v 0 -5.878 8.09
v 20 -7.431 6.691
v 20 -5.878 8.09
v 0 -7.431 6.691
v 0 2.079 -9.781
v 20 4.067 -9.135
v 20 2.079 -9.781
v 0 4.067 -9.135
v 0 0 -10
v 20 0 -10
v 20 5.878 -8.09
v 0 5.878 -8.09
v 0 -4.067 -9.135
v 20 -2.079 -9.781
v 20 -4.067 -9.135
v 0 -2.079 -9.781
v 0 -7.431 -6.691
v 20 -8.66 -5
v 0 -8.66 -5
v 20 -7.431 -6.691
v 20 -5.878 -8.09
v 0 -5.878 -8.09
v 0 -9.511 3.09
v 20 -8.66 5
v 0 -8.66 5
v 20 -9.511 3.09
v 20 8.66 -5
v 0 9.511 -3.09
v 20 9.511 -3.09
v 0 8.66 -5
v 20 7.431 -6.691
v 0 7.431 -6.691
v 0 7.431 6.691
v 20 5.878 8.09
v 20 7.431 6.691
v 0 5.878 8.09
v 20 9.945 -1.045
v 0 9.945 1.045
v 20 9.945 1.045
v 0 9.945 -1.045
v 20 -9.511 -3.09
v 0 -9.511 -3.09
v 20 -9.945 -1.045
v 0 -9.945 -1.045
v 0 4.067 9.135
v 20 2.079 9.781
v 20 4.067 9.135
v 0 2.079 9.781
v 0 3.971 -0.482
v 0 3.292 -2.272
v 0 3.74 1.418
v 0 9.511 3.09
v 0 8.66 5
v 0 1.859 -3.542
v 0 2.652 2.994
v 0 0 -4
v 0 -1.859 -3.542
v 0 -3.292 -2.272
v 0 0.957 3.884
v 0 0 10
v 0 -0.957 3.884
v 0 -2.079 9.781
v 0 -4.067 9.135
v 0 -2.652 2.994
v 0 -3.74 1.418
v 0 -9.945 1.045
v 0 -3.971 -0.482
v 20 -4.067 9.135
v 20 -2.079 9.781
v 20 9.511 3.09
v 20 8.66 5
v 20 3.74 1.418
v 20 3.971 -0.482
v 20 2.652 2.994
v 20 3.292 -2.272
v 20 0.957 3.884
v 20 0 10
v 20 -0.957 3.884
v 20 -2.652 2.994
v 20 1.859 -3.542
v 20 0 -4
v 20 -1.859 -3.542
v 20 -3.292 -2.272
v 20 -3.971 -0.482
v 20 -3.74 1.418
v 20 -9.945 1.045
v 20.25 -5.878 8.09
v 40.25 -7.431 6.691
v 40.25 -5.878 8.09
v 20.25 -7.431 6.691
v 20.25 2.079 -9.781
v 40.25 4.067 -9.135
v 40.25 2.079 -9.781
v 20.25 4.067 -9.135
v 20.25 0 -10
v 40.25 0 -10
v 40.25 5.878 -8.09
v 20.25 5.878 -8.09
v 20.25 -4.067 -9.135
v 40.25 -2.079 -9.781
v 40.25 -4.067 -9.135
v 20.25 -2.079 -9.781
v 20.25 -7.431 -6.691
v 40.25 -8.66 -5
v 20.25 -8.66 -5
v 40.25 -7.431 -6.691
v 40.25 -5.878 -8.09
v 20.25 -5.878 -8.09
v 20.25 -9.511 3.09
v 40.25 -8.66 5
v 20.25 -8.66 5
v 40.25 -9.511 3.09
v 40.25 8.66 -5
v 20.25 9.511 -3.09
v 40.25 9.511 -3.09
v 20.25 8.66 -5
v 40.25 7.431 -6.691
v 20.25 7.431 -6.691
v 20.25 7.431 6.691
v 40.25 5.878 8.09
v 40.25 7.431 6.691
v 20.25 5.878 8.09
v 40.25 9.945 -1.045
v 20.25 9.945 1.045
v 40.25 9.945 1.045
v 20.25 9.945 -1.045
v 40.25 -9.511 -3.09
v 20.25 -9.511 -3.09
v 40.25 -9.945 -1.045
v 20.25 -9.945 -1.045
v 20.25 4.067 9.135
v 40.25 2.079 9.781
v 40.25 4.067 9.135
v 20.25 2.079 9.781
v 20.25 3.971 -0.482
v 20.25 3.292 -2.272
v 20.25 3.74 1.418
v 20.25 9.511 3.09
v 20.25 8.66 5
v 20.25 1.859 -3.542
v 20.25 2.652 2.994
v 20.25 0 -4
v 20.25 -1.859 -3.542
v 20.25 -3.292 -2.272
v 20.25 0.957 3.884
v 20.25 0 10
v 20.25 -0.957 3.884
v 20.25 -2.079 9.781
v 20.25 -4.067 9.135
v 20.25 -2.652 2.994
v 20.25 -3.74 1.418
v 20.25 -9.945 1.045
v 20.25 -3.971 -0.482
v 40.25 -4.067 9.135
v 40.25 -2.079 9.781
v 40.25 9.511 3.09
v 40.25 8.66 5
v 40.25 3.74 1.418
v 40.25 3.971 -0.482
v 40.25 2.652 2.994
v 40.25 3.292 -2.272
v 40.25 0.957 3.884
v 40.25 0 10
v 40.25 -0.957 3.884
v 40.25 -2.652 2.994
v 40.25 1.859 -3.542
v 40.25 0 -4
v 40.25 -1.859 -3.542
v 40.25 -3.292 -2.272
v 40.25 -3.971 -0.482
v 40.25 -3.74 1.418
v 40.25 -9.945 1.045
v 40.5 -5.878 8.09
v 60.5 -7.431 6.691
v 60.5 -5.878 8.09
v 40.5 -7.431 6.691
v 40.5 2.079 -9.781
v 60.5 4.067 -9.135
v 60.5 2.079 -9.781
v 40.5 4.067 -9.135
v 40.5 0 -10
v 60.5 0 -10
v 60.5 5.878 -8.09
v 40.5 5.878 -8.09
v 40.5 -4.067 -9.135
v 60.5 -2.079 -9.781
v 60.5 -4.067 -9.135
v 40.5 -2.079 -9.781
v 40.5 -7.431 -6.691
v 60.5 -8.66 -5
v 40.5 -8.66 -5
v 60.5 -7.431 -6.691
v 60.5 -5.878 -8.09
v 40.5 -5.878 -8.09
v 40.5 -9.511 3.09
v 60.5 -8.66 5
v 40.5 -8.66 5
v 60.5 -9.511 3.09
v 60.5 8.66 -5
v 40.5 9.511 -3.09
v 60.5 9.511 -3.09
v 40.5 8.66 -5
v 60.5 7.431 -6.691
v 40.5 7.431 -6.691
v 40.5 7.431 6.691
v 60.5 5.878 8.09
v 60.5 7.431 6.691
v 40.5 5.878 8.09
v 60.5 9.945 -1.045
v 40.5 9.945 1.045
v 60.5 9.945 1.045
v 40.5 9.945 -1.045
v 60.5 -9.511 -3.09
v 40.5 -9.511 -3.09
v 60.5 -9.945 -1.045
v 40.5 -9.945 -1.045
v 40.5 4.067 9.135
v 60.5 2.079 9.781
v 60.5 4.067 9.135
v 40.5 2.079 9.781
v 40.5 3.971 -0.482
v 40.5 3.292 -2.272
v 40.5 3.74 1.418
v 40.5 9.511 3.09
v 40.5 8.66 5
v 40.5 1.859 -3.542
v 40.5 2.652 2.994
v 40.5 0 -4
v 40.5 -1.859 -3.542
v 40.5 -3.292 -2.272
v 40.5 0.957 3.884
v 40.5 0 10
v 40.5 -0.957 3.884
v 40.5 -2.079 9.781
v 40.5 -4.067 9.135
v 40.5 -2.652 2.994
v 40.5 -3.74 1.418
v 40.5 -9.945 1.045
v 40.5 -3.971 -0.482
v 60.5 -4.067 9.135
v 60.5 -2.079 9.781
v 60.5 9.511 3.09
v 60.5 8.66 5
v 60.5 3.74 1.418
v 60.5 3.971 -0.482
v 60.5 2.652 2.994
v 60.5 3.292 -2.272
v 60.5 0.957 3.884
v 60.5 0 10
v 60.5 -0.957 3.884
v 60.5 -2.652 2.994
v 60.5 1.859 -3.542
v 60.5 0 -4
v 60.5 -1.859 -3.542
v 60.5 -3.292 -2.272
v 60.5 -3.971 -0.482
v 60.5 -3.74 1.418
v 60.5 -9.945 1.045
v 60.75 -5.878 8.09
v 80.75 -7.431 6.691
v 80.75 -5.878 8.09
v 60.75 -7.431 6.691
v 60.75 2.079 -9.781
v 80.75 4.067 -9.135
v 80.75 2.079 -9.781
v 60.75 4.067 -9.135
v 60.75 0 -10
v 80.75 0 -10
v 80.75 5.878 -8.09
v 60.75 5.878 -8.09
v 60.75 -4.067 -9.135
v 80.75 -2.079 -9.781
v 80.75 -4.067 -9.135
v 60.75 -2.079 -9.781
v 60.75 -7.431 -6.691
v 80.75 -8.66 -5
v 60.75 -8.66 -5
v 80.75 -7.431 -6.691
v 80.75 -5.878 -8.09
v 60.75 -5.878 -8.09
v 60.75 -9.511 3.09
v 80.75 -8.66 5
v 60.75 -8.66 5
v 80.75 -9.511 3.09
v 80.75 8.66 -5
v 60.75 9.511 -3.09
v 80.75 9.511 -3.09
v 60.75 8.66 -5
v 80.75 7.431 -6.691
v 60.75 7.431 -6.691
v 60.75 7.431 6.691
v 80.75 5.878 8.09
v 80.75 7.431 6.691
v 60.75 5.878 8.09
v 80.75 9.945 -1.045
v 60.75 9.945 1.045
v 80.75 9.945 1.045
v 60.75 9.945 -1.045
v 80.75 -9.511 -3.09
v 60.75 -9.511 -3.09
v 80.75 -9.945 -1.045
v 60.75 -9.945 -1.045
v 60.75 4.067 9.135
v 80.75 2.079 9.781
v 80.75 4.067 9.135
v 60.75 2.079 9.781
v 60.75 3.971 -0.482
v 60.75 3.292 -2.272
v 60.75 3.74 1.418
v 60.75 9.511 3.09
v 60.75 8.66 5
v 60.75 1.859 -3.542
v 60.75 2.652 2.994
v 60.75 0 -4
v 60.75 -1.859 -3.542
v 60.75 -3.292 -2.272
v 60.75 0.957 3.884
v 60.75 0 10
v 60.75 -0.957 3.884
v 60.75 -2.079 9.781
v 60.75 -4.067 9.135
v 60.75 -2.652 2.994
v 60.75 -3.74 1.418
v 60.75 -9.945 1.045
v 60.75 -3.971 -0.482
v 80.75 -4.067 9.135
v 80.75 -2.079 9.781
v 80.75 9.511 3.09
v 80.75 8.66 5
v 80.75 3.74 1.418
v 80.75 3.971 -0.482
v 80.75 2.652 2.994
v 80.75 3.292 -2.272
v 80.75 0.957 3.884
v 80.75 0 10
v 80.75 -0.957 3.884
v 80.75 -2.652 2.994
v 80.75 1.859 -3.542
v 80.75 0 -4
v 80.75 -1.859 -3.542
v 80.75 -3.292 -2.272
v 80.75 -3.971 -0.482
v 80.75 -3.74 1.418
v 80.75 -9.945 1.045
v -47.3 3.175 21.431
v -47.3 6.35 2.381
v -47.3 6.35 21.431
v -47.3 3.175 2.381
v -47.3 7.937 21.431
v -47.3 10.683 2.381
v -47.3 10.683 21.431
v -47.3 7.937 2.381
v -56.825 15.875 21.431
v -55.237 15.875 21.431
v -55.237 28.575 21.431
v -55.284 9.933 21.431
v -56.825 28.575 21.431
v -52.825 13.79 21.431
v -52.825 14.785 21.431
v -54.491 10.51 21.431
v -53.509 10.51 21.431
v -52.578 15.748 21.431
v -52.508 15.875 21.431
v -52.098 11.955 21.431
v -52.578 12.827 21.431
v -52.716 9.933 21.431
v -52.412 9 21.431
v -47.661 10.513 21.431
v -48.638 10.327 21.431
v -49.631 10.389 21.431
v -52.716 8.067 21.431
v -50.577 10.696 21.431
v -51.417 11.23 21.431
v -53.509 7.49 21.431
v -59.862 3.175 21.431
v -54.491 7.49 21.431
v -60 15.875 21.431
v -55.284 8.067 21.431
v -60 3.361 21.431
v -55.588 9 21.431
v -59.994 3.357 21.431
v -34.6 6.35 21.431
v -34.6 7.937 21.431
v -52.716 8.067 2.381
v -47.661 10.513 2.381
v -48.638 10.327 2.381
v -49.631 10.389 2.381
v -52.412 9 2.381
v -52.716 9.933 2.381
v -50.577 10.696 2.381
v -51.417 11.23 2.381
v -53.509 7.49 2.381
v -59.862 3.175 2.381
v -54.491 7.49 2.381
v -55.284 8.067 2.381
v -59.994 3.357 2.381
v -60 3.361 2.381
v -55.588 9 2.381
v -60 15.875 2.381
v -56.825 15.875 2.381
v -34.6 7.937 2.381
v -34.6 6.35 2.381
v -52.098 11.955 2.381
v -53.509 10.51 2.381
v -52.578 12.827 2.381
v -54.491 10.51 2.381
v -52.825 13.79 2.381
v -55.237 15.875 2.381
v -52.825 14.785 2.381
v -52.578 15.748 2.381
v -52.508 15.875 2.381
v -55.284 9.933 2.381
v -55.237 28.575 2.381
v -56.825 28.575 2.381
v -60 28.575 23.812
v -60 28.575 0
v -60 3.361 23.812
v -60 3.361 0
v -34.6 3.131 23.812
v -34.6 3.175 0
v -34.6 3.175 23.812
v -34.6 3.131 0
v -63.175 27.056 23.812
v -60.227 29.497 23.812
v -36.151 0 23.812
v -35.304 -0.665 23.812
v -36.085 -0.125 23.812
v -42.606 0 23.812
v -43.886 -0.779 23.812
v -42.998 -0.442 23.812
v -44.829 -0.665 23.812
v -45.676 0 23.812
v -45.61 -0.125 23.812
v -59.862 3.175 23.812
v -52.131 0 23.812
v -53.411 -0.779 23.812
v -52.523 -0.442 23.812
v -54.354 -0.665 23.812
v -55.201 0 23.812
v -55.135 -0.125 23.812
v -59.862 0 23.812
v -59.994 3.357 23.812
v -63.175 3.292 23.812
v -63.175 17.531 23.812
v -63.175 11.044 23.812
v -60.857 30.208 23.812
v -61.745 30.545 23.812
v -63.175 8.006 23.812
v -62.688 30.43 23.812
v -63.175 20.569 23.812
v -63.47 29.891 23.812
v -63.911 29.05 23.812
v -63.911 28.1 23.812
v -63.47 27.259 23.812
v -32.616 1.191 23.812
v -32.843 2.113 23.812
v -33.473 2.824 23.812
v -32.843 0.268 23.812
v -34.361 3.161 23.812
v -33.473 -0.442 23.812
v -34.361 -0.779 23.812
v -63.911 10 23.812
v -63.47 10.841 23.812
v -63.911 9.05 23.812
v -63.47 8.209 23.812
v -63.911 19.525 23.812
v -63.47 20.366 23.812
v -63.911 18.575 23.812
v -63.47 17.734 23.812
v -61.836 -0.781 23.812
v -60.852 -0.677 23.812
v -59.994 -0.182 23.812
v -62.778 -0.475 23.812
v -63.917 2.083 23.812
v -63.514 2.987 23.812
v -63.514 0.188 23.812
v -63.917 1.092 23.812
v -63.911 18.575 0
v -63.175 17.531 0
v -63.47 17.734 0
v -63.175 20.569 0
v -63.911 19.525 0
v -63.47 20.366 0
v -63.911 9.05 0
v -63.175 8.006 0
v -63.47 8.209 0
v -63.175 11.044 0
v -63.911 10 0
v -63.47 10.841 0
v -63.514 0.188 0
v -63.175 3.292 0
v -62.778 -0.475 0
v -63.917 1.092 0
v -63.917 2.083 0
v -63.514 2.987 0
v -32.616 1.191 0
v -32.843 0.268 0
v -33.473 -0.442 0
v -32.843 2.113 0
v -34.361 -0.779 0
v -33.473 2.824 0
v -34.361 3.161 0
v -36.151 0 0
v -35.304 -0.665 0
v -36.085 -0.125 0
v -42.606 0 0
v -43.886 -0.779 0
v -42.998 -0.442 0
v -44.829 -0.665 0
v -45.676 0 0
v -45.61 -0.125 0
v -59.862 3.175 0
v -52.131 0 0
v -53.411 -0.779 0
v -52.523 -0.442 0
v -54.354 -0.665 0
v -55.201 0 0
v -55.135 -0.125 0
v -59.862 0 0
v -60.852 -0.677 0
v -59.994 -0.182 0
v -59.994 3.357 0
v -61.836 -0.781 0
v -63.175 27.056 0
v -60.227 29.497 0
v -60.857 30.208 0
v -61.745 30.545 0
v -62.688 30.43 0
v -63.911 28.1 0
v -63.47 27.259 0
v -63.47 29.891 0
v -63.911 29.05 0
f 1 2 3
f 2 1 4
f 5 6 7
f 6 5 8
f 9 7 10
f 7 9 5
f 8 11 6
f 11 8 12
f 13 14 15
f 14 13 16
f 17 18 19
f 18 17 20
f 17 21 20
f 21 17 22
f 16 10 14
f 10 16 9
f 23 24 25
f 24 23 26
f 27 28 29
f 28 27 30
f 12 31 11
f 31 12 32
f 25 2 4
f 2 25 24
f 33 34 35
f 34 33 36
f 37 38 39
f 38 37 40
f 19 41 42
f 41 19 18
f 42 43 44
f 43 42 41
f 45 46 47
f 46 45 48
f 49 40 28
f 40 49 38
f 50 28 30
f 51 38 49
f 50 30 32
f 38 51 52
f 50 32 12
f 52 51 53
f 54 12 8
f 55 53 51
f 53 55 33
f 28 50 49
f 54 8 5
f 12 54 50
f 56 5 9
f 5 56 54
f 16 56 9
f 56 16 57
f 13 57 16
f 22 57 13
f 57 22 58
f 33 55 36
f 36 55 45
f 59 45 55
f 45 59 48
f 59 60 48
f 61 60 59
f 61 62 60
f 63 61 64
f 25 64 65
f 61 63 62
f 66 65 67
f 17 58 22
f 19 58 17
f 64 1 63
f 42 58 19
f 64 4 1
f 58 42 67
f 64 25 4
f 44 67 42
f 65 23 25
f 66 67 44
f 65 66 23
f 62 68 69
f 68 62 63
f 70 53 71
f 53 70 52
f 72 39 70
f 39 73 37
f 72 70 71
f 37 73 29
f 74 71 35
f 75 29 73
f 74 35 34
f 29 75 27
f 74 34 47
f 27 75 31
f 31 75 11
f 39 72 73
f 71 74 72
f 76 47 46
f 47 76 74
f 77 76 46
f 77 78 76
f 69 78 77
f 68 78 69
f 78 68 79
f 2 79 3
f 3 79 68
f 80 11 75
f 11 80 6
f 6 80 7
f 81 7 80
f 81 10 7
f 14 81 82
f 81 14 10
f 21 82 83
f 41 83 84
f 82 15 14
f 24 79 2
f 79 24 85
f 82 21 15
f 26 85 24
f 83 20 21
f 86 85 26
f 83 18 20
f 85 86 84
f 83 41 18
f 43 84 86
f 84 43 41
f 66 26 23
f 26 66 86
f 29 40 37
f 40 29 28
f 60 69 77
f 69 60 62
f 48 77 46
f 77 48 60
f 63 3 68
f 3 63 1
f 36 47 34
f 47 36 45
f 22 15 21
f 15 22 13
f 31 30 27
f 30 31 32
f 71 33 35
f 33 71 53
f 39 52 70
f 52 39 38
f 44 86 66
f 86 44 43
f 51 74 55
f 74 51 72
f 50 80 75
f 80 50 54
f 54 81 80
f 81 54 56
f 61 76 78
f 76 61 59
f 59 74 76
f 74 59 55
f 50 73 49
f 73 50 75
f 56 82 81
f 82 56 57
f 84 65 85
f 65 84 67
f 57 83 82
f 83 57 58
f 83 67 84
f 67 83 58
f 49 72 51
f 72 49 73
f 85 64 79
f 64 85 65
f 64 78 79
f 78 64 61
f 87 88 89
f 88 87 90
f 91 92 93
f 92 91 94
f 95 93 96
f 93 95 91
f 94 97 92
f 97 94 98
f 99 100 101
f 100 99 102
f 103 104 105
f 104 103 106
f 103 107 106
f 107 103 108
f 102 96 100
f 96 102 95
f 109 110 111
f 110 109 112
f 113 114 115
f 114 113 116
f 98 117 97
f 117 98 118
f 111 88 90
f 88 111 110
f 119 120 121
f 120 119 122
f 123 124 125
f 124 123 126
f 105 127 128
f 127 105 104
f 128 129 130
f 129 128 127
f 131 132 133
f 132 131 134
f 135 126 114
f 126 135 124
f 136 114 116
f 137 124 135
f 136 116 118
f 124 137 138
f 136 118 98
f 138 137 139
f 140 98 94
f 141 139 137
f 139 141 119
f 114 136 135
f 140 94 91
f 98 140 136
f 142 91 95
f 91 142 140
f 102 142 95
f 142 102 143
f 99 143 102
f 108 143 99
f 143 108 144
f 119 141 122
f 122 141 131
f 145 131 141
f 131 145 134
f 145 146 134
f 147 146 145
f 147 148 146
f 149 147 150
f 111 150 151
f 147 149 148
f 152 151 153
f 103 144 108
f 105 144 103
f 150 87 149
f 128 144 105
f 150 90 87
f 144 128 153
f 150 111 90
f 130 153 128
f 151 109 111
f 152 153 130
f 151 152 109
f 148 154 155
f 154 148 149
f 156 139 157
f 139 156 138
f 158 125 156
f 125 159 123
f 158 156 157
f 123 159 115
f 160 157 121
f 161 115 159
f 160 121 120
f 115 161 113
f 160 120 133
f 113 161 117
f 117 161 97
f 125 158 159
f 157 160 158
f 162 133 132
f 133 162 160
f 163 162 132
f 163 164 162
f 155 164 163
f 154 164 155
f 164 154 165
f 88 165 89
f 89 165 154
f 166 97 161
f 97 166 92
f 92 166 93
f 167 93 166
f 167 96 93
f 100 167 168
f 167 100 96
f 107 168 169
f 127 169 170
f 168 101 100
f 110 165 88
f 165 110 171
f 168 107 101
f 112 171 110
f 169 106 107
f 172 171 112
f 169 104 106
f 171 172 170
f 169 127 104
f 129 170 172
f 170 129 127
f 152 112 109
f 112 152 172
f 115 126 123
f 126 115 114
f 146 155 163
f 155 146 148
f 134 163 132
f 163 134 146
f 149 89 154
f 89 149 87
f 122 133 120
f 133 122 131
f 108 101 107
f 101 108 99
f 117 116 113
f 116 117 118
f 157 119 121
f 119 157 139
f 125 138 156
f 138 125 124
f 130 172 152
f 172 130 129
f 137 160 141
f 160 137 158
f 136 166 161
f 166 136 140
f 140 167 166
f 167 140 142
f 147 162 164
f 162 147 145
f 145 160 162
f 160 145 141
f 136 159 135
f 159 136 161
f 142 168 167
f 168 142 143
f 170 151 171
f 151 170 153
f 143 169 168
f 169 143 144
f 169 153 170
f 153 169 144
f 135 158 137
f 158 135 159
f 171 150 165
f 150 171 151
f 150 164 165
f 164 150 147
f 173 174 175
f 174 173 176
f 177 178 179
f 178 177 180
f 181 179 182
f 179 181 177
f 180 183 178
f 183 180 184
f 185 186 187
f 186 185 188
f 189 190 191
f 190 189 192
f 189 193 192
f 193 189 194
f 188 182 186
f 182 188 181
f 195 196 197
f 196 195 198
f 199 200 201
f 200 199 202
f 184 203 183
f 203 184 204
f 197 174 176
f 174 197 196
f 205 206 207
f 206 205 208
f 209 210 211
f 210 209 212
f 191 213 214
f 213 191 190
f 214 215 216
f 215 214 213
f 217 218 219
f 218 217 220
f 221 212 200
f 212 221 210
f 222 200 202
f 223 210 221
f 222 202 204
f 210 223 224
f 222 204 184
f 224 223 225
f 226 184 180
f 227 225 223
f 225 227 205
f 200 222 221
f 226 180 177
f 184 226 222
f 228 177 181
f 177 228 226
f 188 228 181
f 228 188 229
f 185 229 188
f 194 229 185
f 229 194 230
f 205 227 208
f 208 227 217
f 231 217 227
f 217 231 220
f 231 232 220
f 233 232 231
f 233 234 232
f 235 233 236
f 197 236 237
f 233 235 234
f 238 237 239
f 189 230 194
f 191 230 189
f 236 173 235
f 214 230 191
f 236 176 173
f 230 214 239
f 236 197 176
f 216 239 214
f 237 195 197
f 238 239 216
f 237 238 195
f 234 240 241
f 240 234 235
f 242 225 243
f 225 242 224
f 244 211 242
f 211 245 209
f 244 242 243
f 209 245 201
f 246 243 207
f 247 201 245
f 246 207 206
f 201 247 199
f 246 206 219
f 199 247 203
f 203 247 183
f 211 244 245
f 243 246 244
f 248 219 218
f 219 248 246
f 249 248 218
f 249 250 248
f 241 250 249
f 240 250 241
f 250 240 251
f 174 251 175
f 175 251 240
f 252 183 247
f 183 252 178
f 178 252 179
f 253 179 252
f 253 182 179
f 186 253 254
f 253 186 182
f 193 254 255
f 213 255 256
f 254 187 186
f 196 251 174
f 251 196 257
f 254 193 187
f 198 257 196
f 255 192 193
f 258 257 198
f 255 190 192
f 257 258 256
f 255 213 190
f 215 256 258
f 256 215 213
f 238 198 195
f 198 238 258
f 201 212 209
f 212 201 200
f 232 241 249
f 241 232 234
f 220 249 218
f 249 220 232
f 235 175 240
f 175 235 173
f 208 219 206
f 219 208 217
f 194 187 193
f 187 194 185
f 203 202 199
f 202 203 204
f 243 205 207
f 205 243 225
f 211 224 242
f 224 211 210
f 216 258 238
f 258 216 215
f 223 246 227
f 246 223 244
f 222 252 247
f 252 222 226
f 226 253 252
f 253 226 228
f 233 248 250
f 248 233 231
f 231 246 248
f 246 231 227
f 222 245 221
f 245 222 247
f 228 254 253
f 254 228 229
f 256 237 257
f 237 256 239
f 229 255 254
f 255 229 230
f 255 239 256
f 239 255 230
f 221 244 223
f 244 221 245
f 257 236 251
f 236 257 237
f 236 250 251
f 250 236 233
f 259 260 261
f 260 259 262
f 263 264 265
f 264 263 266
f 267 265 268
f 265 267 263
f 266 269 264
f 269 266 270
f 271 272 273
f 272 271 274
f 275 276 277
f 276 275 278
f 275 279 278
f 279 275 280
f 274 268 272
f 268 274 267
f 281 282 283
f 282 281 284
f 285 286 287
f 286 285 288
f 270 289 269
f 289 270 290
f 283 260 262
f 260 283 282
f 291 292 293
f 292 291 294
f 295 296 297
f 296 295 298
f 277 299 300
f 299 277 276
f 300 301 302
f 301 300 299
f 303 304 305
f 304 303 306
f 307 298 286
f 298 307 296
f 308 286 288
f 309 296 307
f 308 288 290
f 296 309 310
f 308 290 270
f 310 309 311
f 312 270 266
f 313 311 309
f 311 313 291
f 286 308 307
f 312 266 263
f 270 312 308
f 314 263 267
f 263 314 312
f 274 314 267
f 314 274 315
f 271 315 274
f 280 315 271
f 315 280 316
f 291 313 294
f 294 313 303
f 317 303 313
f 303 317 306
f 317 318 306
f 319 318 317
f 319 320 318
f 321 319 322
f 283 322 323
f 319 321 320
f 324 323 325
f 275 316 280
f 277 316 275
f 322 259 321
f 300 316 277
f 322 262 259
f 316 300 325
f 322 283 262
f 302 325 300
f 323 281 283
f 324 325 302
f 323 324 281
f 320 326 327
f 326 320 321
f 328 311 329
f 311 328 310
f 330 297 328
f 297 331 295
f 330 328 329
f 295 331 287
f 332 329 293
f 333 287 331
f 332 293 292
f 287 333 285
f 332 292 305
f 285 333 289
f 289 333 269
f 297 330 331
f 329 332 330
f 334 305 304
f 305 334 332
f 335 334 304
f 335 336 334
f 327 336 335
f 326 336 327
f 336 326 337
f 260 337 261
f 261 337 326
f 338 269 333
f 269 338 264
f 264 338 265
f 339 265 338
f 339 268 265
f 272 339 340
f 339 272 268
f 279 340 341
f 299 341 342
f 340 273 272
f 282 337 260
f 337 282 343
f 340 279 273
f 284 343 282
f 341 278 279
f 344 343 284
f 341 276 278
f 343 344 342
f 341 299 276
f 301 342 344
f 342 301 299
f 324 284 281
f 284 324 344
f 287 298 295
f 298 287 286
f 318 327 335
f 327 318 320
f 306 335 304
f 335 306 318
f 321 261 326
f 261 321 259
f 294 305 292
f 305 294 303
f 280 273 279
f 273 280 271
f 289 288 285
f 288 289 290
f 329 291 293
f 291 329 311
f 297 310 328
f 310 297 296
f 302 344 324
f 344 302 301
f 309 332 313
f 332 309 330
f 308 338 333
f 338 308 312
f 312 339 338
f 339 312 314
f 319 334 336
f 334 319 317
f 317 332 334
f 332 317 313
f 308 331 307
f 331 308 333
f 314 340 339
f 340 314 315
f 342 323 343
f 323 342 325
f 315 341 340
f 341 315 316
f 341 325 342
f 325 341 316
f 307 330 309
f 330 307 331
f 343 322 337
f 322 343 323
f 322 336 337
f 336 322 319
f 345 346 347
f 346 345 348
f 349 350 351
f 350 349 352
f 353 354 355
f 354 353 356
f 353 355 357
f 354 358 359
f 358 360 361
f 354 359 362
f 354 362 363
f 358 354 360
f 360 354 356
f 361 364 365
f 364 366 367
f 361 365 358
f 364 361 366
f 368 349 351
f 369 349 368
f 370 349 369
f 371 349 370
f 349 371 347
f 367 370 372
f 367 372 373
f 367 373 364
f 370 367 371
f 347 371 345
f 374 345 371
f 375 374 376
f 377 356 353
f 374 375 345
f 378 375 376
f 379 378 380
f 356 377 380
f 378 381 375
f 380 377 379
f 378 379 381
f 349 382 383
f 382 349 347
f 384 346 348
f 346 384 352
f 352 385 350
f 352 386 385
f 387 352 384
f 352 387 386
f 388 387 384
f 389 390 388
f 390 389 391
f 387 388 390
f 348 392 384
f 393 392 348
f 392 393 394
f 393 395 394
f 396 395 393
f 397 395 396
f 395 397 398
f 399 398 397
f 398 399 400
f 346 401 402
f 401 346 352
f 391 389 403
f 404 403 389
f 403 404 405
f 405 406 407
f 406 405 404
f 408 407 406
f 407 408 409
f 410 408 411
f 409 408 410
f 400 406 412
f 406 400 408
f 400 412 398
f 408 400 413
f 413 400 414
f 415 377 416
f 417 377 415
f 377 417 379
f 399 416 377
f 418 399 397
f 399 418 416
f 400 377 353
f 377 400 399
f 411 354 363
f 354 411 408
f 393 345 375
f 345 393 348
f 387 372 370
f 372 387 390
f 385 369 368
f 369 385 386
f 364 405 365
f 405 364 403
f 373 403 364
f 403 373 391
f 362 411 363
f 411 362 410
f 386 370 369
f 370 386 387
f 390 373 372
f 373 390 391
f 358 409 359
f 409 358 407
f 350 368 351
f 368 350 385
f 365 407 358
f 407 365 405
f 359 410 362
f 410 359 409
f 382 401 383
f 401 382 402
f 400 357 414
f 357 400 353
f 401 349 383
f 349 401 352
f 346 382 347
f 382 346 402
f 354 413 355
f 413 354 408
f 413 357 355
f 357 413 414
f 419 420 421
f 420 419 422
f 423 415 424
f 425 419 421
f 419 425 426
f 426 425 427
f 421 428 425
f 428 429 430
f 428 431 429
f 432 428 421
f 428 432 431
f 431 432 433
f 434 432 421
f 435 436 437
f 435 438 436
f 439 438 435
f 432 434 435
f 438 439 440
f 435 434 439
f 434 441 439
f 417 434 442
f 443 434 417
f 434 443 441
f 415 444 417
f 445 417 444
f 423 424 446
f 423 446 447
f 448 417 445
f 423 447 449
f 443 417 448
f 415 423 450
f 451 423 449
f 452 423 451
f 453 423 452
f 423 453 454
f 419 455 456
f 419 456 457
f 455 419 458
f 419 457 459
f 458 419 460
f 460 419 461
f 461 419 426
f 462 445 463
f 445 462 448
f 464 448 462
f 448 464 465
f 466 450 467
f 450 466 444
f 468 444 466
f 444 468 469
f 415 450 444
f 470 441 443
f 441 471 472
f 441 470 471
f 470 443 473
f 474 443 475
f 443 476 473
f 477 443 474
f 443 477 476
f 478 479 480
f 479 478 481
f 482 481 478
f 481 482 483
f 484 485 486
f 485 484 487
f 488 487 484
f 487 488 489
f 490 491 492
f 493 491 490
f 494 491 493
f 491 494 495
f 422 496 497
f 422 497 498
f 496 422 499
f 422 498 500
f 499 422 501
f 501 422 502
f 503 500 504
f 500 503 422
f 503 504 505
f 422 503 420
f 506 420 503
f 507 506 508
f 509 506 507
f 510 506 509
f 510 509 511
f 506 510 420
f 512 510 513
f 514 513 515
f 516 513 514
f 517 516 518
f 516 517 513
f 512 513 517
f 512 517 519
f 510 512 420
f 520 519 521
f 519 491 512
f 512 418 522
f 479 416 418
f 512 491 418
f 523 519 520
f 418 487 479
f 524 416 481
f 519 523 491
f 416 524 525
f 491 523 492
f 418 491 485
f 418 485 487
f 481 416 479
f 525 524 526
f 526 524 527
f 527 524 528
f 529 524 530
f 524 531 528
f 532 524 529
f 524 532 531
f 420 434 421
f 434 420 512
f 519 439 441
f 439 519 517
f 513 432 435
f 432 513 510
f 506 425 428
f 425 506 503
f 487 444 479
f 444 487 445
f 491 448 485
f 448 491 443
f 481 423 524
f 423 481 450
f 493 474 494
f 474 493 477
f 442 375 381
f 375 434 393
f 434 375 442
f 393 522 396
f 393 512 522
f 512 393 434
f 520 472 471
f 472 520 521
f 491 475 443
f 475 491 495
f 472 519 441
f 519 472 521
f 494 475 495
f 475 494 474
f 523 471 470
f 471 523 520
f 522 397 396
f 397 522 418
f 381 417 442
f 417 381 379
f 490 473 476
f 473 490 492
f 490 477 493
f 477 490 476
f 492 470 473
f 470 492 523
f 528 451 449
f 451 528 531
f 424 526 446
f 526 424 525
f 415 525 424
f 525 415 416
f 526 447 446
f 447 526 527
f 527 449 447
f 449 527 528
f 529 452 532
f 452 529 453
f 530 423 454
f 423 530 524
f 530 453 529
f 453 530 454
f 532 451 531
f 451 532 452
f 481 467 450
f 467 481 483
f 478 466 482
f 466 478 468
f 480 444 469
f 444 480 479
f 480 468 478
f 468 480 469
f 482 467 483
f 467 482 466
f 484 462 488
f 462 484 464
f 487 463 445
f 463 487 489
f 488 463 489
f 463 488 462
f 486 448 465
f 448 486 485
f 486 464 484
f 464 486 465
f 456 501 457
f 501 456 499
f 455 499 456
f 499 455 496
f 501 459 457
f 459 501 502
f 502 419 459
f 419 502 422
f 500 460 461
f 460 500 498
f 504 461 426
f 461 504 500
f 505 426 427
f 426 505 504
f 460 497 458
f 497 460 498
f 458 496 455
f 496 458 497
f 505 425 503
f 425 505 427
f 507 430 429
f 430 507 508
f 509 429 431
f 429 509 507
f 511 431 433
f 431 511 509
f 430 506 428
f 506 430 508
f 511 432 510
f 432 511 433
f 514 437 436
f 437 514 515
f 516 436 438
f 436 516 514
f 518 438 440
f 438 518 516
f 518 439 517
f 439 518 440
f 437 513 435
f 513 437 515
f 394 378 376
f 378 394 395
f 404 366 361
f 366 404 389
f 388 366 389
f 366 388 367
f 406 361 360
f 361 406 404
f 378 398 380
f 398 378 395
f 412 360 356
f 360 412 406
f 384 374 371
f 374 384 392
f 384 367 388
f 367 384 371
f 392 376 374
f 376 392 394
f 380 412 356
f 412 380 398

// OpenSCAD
// file: joints.scad
/**
 * joints.scad is part of Paper Laptop project.
 * This file contains various models for joining two or
 * more pieces of flat materials together.
 *
 * @author R. S. Doiel, <rsdoiel@gmail.com>
 * copyright (c) 2016 all rights reserved
 * Released under a BSD 2-clause license
 */

// Foam board firm enough to make a case with is about
// 1/8th to 1/4th inch (6.35mm) thick. Usually sold in single sheets
// of about 20"x30".

//
// Basic models are for parts without any holes for fasteners.
//

/*
 * CornerBasic() - corner joint without fastener hole
 */
module CornerBasic() {
    u = 3.175; // Unit is 3.175mm or 1/8th inch:w
    t = 6.35; // Thickness of the 1/4th" Foam board

    // Inner block, width, depth, height
    translate([0, t, t/2]) {
        difference() {
            color([1,0,0]) cube([25.4, 25.4, 25.4]);
            translate([t*3.5,t*3.5,-1]) {
                color([1,0,1]) cylinder(h=28,r=t*1.25,center=false);
            }
        }
    }

     // Inner shell
    translate([t,2*t,t/2]) {
        color([0,1,0]) cube([50.8-t,t/2,25.4]);
        color([0,1,0]) cube([t/2,50.8-t,25.4]);
    }

    // Outer shell
    color([0,1,0]) cube([50.8,t,25.4+t]);
    translate([-t,t,0]) {
        color([0,1,0]) cube([t,50.8,25.4+t]);
    }
    // Outer corners
    translate([u*-1,u,0]) {
        color([0,1,0]) cylinder(h=25.4+t,r=1.5*u,center=false);
    }

    // Outer bumps
    translate([u*-1.25,u*18,0]) {
        color([0,1,0]) cylinder(h=25.4+t,r=1.25*u,center=false);
    }
    translate([u*-1.25,u*12,0]) {
        color([0,1,0]) cylinder(h=25.4+t,r=1.25*u,center=false);
    }
    translate([u*-1.25,u*6,0]) {
        color([0,1,0]) cylinder(h=25.4+t,r=1.25*u,center=false);
    }

    translate([u*16,u*0.75,0]) {
        color([0,1,0]) cylinder(h=25.4+t,r=1.25*u,center=false);
    }
    translate([u*10,u*0.75,0]) {
        color([0,1,0]) cylinder(h=25.4+t,r=1.25*u,center=false);
    }
    translate([u*4,u*0.75,0]) {
        color([0,1,0]) cylinder(h=25.4+t,r=1.25*u,center=false);
    }
}

//
// Corner() basic corner joint plus hole for fastener
//
module Corner() {
    // Scale down the basic corner so that the
    // for 50% width/depth, 75% of height
    scale([0.5, 0.5, 0.75]) {
        difference() {
            u = 3.175;
            CornerBasic();
            // Add a hole for screw
            translate([12,18,0]) {
                color([0,0,1]) cylinder(
                    h=25.4+(4*u),
                    r=u,
                    center=false
                );
            }
        }
    }
}

//
// EndBasic
//
module EndBasic() {
    u = 3.175; // Unit is 3.175mm or 1/8th inch:w
    t = 6.35; // Thickness of the 1/4th" Foamboard

    // Inner block, width, depth, height
    translate([0, t, t]) {
            color([1,0,0]) cube([25.4, 25.4, 25.4]);
    }
    // Outer shell
    color([0,1,0]) cube([50.8,t,25.4+(2*t)]);

    // Outer corners
    translate([u*-1,u,0]) {
        color([0,1,0]) cylinder(h=25.4+(2*t),r=1.5*u,center=false);
    }

    translate([u*16,u*0.75,0]) {
        color([0,1,0]) cylinder(h=25.4+(2*t),r=1.25*u,center=false);
    }
    translate([u*10,u*0.75,0]) {
        color([0,1,0]) cylinder(h=25.4+(2*t),r=1.25*u,center=false);
    }
    translate([u*4,u*0.75,0]) {
        color([0,1,0]) cylinder(h=25.4+(2*t),r=1.25*u,center=false);
    }

    // Inner shell
    translate([t,2*t,t]) {
        color([0,1,0]) cube([50.8-t,t,25.4]);
    }
}

//
// End() basic corner joint plus hole for fastener
//
module End() {
    // Scale down the basic corner so that the
    // for 50% width/depth, 75% of height
    scale([0.5, 0.5, 0.75]) {
        difference() {
            u = 3.175;
            EndBasic();
            // Add a hole for screw
            translate([12,18,0]) {
                color([0,0,1]) cylinder(h=25.4+(4*u),r=u,center=false);
            }
        }
    }
}

//
// SpliceBasic
//
module SpliceBasic() {
    u = 3.175; // Unit is 3.175mm or 1/8th inch:w
    t = 6.35; // Thickness of the 1/4th" Foamboard

    // Inner block (cube: [width, depth, height])
    translate([0, t, t]) {
            color([1,0,0]) cube([25.4, 25.4, 25.4]);
    }
    // Outer shell
    color([0,1,0]) cube([50.8,t,25.4+(2*t)]);

    // Outer corners
    translate([u*16,u*0.75,0]) {
        color([0,1,0]) cylinder(h=25.4+(2*t),r=1.25*u,center=false);
    }
    translate([u*10,u*0.75,0]) {
        color([0,1,0]) cylinder(h=25.4+(2*t),r=1.25*u,center=false);
    }
    translate([u*4,u*0.75,0]) {
        color([0,1,0]) cylinder(h=25.4+(2*t),r=1.25*u,center=false);
    }

    // Inner shell
    translate([t,2*t,t]) {
        color([0,1,0]) cube([50.8-t,t,25.4]);
    }

    // Mirrored shapes
    mirror(180) {
        // Inner block (cube: [width, depth, height])
        translate([0, t, t]) {
                color([1,0,0]) cube([25.4, 25.4, 25.4]);
        }
        // Outer shell
        color([0,1,0]) cube([50.8,t,25.4+(2*t)]);

        // Outer corners
        translate([u*16,u*0.75,0]) {
            color([0,1,0]) cylinder(h=25.4+(2*t),r=1.25*u,center=false);
        }
        translate([u*10,u*0.75,0]) {
            color([0,1,0]) cylinder(h=25.4+(2*t),r=1.25*u,center=false);
        }
        translate([u*4,u*0.75,0]) {
            color([0,1,0]) cylinder(h=25.4+(2*t),r=1.25*u,center=false);
        }

        // Inner shell
        translate([t,2*t,t]) {
            color([0,1,0]) cube([50.8-t,t,25.4]);
        }
    }
}

//
// Splice() basic corner joint plus hole for fastener
//
module Splice() {
    scale([0.5, 0.5, 0.75]) {
        difference() {
            u = 3.175;
            SpliceBasic();
            // Add a hole for screw
            translate([0,18,0]) {
                color([0,0,1]) cylinder(h=25.4+(4*u),r=u,center=false);
            }
        }
    }
}


// Four corner joints
module FourCornersGrouped() {
    Corner();
    translate([120,6.35,0]) {
        rotate(90) {
            Corner();
        }
    }
    translate([114, 124, 0]) {
        rotate(180) {
            Corner();
            translate([120,6.35,0]) {
                rotate(90) {
                    Corner();
                }
            }
        }
    }
}

// Two End Pieces
module TwoEndsGrouped() {
    translate([0, 0, 0]) {
        End();
    }
    translate([114, 0, 0]) {
        mirror(180) End();
    }
}

module TwoSplicesGrouped() {
    translate([58, 0, 0]) {
        Splice();
    }
    translate([58, 38, 0]) {
        Splice();
    }
}

//Corner();
//Splice();
//End();
//FourCornersGrouped();
//TwoEndsGrouped();
//TwoSplicesGrouped();
// main file
/**
 * hinge.scad is part of Paper Laptop.
 * It describes a simple hinge for attaching the
 * screen section to the base section.
 *
 * @author R. S. Doiel, <rsdoiel@gmail.com>
 * copyright (c) 2016 all rights reserved
 * Released under a BSD 2-clause license
 */
include <joints.scad>

module pinslieve() {
    difference() {
        cylinder(20,10,10,false);
        translate([0,0,-2]) {
            cylinder(24,4,4,false);
        }
    }
}

rotate([0,90,0]) {
    pinslieve();
}

translate([20.25,0,0]) {
    rotate([0,90,0]) {
        pinslieve();
    }
}

translate([40.5,0,0]) {
    rotate([0,90,0]) {
        pinslieve();
    }
}
translate([60.75,0,0]) {
    rotate([0,90,0]) {
        pinslieve();
    }
}

translate([-60,0,0]) {
Corner();
}
